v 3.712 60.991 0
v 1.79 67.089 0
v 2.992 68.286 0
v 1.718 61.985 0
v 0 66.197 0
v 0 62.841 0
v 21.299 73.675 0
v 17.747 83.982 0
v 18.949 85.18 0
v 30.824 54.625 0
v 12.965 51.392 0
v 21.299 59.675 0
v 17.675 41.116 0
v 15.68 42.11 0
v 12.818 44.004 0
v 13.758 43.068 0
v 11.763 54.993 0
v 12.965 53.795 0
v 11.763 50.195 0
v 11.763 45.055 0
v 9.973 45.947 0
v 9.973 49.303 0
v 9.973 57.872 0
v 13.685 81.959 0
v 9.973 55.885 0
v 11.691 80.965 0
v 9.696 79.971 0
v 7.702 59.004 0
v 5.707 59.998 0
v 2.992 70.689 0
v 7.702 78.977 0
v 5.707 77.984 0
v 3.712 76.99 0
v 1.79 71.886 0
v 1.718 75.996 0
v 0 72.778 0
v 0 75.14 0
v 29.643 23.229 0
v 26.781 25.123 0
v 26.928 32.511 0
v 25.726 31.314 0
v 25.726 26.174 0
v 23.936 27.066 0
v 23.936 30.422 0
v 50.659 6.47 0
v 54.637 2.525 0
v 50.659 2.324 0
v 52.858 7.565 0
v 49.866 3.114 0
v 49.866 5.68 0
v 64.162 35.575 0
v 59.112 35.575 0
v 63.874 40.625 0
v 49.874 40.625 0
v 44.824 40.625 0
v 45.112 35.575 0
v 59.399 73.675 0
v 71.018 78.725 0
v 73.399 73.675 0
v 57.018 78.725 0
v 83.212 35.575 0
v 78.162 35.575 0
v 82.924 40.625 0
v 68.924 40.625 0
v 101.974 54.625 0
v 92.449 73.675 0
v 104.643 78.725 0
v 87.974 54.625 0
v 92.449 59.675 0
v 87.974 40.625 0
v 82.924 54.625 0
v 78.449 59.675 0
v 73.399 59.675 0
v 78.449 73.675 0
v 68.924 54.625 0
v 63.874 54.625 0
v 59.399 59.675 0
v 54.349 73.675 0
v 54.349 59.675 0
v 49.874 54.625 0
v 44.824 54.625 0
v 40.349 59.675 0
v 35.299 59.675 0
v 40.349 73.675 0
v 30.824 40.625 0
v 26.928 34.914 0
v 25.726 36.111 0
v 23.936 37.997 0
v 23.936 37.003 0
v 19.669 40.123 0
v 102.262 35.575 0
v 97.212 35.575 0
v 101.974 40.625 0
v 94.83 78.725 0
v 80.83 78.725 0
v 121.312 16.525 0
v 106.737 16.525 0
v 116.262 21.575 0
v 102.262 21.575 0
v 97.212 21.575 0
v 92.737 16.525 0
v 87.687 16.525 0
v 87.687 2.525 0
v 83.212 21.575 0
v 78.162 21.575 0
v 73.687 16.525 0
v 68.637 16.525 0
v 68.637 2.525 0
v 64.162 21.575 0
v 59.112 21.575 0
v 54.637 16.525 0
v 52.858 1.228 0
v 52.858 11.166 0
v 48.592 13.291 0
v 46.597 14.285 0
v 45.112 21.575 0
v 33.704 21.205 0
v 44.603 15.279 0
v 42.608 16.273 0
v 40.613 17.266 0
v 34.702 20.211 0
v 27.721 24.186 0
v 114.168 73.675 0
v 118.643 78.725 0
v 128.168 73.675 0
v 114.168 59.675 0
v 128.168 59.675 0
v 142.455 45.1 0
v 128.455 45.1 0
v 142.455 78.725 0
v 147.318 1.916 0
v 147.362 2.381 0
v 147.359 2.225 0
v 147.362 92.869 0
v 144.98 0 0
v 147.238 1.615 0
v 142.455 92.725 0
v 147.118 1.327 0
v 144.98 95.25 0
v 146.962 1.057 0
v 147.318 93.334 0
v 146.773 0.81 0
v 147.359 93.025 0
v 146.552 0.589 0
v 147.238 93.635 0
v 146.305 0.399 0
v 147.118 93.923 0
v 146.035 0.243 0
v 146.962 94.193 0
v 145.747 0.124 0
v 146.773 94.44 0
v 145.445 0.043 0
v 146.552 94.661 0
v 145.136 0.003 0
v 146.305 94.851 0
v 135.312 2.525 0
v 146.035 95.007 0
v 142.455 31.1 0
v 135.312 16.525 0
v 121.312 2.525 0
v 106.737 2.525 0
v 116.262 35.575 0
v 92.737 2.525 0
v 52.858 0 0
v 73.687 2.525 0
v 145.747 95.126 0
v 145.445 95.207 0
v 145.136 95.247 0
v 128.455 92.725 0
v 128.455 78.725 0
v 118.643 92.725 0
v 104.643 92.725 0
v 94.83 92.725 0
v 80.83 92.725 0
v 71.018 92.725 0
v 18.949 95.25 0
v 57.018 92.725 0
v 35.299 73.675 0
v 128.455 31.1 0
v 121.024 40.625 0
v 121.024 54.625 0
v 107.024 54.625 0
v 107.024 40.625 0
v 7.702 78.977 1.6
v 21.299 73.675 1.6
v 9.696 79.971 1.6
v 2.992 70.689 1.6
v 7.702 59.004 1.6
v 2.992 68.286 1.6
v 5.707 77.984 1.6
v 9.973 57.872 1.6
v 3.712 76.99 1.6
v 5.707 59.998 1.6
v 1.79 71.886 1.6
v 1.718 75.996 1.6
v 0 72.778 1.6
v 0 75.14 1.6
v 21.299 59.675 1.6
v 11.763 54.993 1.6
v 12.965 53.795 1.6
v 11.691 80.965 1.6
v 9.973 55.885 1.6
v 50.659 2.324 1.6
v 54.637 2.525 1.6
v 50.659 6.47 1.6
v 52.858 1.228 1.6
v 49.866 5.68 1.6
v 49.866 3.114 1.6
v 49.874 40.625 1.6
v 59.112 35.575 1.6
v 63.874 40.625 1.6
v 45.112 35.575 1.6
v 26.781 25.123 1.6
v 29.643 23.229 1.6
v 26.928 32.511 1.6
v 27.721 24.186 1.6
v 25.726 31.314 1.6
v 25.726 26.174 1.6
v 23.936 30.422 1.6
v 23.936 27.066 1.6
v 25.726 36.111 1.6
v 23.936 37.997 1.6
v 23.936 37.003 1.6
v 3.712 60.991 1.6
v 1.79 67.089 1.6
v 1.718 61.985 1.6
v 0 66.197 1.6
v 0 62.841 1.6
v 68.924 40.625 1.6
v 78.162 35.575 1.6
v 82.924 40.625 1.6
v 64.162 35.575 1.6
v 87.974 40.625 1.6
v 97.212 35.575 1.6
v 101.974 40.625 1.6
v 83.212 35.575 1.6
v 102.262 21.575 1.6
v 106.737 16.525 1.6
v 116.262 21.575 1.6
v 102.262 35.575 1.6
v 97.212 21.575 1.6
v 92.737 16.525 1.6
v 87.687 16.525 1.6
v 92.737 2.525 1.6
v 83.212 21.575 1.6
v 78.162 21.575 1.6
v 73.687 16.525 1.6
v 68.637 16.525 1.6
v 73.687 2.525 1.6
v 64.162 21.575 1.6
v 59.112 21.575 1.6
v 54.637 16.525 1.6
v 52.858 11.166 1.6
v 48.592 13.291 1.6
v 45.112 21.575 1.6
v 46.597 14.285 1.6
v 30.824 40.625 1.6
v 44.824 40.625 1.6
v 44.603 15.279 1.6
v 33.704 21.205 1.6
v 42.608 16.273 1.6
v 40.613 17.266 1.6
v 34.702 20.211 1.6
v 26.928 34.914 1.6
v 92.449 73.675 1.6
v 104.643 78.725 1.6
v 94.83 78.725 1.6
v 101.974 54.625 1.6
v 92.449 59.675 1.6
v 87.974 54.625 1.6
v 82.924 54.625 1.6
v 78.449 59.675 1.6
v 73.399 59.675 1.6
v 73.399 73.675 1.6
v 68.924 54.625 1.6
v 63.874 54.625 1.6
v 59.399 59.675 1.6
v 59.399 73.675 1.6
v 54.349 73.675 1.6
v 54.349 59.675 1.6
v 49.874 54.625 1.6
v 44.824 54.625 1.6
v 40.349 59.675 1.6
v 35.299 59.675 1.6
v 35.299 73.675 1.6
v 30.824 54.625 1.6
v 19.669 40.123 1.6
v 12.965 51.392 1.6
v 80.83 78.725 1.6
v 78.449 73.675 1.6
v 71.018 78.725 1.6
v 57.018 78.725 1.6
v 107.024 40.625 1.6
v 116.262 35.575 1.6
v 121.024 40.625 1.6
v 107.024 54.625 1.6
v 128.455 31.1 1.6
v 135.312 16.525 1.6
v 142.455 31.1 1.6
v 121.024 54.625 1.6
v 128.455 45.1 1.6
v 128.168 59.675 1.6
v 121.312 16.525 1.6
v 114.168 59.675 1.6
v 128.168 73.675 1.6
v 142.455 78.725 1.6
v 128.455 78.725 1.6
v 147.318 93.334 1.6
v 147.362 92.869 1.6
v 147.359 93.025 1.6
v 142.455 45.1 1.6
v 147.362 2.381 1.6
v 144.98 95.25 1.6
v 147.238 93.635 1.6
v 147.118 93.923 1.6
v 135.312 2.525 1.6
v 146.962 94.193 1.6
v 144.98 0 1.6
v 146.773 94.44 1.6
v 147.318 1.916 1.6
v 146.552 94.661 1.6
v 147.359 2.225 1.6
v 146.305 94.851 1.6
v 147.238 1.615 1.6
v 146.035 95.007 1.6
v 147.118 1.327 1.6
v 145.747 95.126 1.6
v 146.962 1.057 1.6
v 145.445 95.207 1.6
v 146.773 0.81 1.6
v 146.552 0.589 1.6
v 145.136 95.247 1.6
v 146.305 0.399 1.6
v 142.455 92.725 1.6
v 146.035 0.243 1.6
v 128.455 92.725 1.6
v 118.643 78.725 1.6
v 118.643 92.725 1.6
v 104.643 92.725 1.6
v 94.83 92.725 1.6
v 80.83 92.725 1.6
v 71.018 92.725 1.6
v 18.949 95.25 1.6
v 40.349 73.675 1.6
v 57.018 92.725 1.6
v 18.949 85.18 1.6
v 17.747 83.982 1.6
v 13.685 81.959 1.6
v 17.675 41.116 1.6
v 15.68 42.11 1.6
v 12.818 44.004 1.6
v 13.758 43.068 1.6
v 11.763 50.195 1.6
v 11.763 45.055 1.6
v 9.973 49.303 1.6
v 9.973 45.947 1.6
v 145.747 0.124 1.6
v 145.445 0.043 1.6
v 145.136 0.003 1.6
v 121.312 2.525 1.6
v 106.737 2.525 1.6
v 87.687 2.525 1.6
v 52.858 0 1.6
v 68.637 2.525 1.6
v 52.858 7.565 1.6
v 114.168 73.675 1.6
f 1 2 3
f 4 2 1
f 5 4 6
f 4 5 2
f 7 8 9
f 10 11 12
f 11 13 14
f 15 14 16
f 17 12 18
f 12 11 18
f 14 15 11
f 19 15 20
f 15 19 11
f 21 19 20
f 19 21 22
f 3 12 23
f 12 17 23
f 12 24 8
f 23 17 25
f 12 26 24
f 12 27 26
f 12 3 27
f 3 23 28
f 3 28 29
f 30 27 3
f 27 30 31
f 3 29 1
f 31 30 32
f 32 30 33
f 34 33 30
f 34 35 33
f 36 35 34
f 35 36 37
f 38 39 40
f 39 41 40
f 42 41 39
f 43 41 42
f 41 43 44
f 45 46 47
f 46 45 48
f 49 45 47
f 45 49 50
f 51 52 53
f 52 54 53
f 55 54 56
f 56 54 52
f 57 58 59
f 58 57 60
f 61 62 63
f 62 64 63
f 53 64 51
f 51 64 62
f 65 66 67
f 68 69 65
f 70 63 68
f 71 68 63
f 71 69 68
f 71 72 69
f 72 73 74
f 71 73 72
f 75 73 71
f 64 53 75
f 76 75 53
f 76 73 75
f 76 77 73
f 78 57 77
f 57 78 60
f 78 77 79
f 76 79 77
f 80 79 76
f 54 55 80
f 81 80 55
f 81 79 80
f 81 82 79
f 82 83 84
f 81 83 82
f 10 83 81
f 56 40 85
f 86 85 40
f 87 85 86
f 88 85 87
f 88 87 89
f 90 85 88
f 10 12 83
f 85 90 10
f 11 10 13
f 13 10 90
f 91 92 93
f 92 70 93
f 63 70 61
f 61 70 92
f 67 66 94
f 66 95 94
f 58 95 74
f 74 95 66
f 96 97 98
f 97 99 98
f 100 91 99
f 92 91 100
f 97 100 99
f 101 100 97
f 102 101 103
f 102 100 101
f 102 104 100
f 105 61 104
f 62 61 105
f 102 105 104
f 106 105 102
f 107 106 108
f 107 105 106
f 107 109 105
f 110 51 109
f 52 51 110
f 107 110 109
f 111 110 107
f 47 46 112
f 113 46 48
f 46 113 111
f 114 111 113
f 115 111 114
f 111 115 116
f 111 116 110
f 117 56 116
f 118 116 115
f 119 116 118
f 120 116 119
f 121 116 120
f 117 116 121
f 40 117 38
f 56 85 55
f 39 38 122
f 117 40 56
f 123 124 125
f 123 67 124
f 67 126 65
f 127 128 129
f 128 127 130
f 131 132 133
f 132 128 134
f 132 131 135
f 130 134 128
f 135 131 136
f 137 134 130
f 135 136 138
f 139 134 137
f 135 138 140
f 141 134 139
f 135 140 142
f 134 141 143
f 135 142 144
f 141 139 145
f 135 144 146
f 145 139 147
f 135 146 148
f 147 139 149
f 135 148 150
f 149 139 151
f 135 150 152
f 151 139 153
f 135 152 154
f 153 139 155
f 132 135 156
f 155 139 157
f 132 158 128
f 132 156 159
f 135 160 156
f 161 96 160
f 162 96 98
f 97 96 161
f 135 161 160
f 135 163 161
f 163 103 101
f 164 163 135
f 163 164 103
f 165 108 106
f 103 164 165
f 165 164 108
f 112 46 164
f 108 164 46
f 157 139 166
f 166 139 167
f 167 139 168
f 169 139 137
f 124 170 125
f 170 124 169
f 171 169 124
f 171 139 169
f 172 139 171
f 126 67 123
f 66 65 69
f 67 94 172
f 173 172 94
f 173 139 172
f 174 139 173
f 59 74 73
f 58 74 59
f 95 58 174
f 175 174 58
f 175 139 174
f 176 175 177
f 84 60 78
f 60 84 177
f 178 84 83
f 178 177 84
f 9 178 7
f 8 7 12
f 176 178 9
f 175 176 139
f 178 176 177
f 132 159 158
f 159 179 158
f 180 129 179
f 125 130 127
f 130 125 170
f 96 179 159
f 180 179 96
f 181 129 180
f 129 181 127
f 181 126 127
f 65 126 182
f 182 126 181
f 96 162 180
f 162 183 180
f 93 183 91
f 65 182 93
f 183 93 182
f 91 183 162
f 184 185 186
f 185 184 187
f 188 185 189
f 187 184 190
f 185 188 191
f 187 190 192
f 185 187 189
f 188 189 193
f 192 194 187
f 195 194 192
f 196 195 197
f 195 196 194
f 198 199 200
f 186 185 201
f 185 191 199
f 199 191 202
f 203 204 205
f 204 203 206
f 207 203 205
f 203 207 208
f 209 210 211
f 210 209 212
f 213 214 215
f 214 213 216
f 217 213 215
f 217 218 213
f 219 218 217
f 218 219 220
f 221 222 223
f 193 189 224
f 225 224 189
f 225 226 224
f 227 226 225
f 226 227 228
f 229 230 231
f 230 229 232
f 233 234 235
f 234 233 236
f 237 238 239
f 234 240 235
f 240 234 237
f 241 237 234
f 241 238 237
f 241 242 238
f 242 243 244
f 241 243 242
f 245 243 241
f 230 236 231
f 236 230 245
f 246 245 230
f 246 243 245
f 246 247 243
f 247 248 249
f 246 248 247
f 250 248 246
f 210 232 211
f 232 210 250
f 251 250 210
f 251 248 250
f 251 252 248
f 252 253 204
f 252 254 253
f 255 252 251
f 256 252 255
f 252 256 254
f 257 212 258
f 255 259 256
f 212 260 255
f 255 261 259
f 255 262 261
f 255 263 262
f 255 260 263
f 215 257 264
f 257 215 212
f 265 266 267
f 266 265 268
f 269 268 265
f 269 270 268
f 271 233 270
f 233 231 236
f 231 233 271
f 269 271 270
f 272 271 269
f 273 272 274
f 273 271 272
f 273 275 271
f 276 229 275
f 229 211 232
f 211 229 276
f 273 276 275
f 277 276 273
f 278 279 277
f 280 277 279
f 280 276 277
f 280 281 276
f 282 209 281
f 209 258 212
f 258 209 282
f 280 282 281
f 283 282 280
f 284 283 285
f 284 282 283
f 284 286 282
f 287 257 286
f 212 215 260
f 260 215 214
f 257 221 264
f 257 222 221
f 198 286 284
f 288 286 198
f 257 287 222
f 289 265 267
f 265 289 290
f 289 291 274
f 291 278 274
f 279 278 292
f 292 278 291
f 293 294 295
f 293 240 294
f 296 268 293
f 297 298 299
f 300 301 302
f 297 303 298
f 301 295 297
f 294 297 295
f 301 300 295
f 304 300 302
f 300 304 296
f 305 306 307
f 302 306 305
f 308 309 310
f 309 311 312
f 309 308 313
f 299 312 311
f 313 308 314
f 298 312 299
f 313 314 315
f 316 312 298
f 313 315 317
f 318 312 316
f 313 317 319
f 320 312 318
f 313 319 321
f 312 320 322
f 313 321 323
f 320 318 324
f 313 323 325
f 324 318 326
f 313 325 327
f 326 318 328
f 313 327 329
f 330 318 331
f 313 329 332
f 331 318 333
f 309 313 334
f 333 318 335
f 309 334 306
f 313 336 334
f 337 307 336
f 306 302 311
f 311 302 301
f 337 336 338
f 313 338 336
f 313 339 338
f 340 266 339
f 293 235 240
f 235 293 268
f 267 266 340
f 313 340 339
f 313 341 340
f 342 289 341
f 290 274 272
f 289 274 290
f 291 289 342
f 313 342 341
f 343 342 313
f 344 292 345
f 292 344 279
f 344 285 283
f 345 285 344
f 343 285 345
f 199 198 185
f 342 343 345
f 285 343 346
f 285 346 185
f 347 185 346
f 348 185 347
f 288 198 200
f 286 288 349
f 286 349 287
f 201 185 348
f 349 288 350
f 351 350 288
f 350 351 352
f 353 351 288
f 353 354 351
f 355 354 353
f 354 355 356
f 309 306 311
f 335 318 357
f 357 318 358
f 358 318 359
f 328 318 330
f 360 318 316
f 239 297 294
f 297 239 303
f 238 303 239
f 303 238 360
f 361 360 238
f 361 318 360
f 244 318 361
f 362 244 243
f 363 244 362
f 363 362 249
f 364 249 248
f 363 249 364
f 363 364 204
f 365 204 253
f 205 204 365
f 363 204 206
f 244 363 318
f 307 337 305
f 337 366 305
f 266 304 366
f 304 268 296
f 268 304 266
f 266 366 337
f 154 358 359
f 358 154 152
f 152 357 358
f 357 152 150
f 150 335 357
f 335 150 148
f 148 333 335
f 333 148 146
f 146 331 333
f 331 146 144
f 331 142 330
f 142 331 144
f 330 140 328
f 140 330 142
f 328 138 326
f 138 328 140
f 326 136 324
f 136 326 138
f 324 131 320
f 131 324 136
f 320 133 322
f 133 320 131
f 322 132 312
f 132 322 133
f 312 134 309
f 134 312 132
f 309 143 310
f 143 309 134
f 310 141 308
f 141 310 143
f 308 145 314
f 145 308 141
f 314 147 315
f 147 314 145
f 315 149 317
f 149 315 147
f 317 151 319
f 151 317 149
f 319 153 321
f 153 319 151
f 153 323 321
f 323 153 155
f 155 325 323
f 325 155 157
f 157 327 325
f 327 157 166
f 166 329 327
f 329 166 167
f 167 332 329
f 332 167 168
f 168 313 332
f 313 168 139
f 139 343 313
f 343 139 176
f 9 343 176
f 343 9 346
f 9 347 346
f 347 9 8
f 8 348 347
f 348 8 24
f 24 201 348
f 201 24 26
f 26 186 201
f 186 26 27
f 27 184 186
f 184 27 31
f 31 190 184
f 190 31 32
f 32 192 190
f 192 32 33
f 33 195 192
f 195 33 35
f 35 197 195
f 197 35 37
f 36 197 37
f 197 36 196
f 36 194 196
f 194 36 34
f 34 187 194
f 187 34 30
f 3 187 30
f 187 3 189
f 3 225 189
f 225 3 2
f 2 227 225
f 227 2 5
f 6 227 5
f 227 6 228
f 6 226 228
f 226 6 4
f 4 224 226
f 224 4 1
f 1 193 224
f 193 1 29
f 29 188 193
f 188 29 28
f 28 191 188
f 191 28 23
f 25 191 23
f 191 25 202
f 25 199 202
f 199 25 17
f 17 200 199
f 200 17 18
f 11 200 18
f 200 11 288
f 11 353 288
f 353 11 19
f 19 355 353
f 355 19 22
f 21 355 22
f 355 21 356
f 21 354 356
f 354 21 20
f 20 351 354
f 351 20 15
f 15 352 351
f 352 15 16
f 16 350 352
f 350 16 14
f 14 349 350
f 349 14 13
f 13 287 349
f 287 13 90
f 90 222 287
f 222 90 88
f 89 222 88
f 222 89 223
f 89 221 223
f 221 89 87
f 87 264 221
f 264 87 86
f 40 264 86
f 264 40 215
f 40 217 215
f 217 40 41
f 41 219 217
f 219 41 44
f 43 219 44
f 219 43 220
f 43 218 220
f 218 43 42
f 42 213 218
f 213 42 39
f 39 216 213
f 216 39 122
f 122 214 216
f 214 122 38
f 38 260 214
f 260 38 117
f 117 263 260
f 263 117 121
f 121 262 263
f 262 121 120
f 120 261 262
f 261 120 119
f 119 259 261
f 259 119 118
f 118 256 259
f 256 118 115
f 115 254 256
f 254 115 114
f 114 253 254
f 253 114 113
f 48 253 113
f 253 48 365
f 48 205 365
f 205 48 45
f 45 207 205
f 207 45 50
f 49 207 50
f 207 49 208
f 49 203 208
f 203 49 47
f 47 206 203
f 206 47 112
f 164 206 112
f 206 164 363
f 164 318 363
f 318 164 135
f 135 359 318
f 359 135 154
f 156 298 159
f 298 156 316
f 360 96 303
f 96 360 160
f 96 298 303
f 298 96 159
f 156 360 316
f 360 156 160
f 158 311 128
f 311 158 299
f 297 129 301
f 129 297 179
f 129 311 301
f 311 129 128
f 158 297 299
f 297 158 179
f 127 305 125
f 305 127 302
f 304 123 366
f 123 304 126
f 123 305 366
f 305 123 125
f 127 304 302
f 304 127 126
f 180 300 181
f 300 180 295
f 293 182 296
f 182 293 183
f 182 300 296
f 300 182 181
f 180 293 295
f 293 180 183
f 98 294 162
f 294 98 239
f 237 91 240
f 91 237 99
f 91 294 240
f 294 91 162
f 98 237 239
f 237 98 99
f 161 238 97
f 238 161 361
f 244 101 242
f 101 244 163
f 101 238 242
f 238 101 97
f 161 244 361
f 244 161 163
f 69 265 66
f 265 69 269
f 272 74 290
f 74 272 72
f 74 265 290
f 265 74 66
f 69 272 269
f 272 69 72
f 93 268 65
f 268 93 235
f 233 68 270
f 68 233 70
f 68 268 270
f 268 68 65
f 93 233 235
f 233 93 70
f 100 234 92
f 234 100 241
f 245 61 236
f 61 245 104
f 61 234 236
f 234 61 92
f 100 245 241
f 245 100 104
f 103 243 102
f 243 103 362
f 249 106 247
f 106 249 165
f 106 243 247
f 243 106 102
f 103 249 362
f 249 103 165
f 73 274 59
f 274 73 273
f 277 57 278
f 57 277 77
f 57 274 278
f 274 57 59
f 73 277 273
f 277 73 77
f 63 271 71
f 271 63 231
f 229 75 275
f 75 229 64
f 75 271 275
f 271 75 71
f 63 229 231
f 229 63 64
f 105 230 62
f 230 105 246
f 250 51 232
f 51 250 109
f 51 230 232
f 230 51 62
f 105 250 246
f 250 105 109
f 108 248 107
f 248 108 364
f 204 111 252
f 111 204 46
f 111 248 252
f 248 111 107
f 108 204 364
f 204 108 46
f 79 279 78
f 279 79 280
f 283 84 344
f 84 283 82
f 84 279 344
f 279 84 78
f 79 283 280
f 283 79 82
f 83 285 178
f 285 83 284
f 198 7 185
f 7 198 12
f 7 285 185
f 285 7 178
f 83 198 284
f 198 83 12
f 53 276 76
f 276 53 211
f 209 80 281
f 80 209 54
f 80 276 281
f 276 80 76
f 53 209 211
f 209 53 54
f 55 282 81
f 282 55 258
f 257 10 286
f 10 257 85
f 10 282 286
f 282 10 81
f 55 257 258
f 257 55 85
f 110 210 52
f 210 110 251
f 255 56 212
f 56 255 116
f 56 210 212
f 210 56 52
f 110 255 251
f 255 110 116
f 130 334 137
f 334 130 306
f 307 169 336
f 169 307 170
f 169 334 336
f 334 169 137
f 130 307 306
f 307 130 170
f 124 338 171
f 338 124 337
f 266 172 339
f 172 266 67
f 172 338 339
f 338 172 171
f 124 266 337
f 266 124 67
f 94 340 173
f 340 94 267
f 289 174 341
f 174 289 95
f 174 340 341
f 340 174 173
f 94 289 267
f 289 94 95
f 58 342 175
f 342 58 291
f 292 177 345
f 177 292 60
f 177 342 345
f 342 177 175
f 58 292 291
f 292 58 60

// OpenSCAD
// HS source-bound research preview; NOT a finished or printed keyboard plate.
// Original KiCad board edges and selected virtual cut are immutable evidence.
// Key aperture axis/orientation/stabilizers and mounting are NOT physically verified.
plate_thickness=1.6;
// 23 retained source key centers; no mounting points designed.
difference(){
  linear_extrude(height=plate_thickness) polygon(points=[[144.98035,95.25],[145.13626,95.24745],[145.4454,95.20674],[145.74659,95.12603],[146.03467,95.0067],[146.30471,94.8508],[146.55209,94.66097],[146.77257,94.44049],[146.9624,94.19311],[147.11831,93.92307],[147.23763,93.63499],[147.31834,93.3338],[147.35905,93.02466],[147.3616,92.86875],[147.3616,2.38125],[147.35905,2.22534],[147.31834,1.9162],[147.23763,1.61501],[147.11831,1.32693],[146.9624,1.05689],[146.77257,0.80951],[146.55209,0.58903],[146.30471,0.3992],[146.03467,0.24329],[145.74659,0.12397],[145.4454,0.04326],[145.13626,0.00255],[144.98035,0],[52.8582,0],[52.8582,1.22832],[50.65911,2.32389],[49.8663,3.11392],[49.8663,5.67988],[50.65911,6.46991],[52.8582,7.56548],[52.8582,11.1657],[50.58657,12.29753],[48.59186,13.29134],[46.59726,14.28503],[44.60256,15.27884],[42.60796,16.27253],[40.61326,17.26634],[38.61866,18.26003],[36.62396,19.25384],[34.7019,20.2114],[33.7045,21.2052],[31.63735,22.23504],[29.64266,23.22873],[27.72062,24.18638],[26.7807,25.12301],[25.7259,26.17389],[23.9358,27.0658],[23.9358,30.4217],[25.72591,31.31361],[26.9278,32.51116],[26.9278,34.91395],[25.7259,36.11139],[23.9358,37.0033],[23.9358,37.99701],[21.66406,39.12884],[19.66946,40.12253],[17.67476,41.11634],[15.68016,42.11003],[13.75801,43.06769],[12.81812,44.00418],[11.76341,45.05519],[9.9732,45.94702],[9.9732,49.30298],[11.76341,50.19481],[12.9652,51.39238],[12.9652,53.79514],[11.76341,54.99259],[9.9732,55.88451],[9.9732,57.872],[7.70155,59.00384],[5.70686,59.99753],[3.71225,60.99134],[1.71756,61.98503],[0,62.8408],[0,66.19678],[1.79011,67.08861],[2.9919,68.28618],[2.9919,70.68882],[1.79012,71.88638],[0,72.7783],[0,75.1405],[1.71756,75.99627],[3.71228,76.98997],[5.70686,77.98377],[7.70158,78.97747],[9.69616,79.97127],[11.69088,80.96497],[13.68546,81.95877],[15.68016,82.95246],[17.7473,83.9823],[18.9492,85.17986],[18.9492,95.25]]);
    translate([121.3116,2.525,-0.15]) cube([14.0,14.0,plate_thickness+0.3]);
    translate([128.45535,31.1,-0.15]) cube([14.0,14.0,plate_thickness+0.3]);
    translate([114.16785,59.675,-0.15]) cube([14.0,14.0,plate_thickness+0.3]);
    translate([107.0241,40.625,-0.15]) cube([14.0,14.0,plate_thickness+0.3]);
    translate([102.2616,21.575,-0.15]) cube([14.0,14.0,plate_thickness+0.3]);
    translate([92.7366,2.525,-0.15]) cube([14.0,14.0,plate_thickness+0.3]);
    translate([78.4491,59.675,-0.15]) cube([14.0,14.0,plate_thickness+0.3]);
    translate([87.9741,40.625,-0.15]) cube([14.0,14.0,plate_thickness+0.3]);
    translate([83.2116,21.575,-0.15]) cube([14.0,14.0,plate_thickness+0.3]);
    translate([73.6866,2.525,-0.15]) cube([14.0,14.0,plate_thickness+0.3]);
    translate([59.3991,59.675,-0.15]) cube([14.0,14.0,plate_thickness+0.3]);
    translate([68.9241,40.625,-0.15]) cube([14.0,14.0,plate_thickness+0.3]);
    translate([64.1616,21.575,-0.15]) cube([14.0,14.0,plate_thickness+0.3]);
    translate([54.6366,2.525,-0.15]) cube([14.0,14.0,plate_thickness+0.3]);
    translate([40.3491,59.675,-0.15]) cube([14.0,14.0,plate_thickness+0.3]);
    translate([21.2991,59.675,-0.15]) cube([14.0,14.0,plate_thickness+0.3]);
    translate([49.8741,40.625,-0.15]) cube([14.0,14.0,plate_thickness+0.3]);
    translate([30.8241,40.625,-0.15]) cube([14.0,14.0,plate_thickness+0.3]);
    translate([45.1116,21.575,-0.15]) cube([14.0,14.0,plate_thickness+0.3]);
    translate([128.45535,78.725,-0.15]) cube([14.0,14.0,plate_thickness+0.3]);
    translate([104.64285,78.725,-0.15]) cube([14.0,14.0,plate_thickness+0.3]);
    translate([80.83035,78.725,-0.15]) cube([14.0,14.0,plate_thickness+0.3]);
    translate([57.01785,78.725,-0.15]) cube([14.0,14.0,plate_thickness+0.3]);
}
